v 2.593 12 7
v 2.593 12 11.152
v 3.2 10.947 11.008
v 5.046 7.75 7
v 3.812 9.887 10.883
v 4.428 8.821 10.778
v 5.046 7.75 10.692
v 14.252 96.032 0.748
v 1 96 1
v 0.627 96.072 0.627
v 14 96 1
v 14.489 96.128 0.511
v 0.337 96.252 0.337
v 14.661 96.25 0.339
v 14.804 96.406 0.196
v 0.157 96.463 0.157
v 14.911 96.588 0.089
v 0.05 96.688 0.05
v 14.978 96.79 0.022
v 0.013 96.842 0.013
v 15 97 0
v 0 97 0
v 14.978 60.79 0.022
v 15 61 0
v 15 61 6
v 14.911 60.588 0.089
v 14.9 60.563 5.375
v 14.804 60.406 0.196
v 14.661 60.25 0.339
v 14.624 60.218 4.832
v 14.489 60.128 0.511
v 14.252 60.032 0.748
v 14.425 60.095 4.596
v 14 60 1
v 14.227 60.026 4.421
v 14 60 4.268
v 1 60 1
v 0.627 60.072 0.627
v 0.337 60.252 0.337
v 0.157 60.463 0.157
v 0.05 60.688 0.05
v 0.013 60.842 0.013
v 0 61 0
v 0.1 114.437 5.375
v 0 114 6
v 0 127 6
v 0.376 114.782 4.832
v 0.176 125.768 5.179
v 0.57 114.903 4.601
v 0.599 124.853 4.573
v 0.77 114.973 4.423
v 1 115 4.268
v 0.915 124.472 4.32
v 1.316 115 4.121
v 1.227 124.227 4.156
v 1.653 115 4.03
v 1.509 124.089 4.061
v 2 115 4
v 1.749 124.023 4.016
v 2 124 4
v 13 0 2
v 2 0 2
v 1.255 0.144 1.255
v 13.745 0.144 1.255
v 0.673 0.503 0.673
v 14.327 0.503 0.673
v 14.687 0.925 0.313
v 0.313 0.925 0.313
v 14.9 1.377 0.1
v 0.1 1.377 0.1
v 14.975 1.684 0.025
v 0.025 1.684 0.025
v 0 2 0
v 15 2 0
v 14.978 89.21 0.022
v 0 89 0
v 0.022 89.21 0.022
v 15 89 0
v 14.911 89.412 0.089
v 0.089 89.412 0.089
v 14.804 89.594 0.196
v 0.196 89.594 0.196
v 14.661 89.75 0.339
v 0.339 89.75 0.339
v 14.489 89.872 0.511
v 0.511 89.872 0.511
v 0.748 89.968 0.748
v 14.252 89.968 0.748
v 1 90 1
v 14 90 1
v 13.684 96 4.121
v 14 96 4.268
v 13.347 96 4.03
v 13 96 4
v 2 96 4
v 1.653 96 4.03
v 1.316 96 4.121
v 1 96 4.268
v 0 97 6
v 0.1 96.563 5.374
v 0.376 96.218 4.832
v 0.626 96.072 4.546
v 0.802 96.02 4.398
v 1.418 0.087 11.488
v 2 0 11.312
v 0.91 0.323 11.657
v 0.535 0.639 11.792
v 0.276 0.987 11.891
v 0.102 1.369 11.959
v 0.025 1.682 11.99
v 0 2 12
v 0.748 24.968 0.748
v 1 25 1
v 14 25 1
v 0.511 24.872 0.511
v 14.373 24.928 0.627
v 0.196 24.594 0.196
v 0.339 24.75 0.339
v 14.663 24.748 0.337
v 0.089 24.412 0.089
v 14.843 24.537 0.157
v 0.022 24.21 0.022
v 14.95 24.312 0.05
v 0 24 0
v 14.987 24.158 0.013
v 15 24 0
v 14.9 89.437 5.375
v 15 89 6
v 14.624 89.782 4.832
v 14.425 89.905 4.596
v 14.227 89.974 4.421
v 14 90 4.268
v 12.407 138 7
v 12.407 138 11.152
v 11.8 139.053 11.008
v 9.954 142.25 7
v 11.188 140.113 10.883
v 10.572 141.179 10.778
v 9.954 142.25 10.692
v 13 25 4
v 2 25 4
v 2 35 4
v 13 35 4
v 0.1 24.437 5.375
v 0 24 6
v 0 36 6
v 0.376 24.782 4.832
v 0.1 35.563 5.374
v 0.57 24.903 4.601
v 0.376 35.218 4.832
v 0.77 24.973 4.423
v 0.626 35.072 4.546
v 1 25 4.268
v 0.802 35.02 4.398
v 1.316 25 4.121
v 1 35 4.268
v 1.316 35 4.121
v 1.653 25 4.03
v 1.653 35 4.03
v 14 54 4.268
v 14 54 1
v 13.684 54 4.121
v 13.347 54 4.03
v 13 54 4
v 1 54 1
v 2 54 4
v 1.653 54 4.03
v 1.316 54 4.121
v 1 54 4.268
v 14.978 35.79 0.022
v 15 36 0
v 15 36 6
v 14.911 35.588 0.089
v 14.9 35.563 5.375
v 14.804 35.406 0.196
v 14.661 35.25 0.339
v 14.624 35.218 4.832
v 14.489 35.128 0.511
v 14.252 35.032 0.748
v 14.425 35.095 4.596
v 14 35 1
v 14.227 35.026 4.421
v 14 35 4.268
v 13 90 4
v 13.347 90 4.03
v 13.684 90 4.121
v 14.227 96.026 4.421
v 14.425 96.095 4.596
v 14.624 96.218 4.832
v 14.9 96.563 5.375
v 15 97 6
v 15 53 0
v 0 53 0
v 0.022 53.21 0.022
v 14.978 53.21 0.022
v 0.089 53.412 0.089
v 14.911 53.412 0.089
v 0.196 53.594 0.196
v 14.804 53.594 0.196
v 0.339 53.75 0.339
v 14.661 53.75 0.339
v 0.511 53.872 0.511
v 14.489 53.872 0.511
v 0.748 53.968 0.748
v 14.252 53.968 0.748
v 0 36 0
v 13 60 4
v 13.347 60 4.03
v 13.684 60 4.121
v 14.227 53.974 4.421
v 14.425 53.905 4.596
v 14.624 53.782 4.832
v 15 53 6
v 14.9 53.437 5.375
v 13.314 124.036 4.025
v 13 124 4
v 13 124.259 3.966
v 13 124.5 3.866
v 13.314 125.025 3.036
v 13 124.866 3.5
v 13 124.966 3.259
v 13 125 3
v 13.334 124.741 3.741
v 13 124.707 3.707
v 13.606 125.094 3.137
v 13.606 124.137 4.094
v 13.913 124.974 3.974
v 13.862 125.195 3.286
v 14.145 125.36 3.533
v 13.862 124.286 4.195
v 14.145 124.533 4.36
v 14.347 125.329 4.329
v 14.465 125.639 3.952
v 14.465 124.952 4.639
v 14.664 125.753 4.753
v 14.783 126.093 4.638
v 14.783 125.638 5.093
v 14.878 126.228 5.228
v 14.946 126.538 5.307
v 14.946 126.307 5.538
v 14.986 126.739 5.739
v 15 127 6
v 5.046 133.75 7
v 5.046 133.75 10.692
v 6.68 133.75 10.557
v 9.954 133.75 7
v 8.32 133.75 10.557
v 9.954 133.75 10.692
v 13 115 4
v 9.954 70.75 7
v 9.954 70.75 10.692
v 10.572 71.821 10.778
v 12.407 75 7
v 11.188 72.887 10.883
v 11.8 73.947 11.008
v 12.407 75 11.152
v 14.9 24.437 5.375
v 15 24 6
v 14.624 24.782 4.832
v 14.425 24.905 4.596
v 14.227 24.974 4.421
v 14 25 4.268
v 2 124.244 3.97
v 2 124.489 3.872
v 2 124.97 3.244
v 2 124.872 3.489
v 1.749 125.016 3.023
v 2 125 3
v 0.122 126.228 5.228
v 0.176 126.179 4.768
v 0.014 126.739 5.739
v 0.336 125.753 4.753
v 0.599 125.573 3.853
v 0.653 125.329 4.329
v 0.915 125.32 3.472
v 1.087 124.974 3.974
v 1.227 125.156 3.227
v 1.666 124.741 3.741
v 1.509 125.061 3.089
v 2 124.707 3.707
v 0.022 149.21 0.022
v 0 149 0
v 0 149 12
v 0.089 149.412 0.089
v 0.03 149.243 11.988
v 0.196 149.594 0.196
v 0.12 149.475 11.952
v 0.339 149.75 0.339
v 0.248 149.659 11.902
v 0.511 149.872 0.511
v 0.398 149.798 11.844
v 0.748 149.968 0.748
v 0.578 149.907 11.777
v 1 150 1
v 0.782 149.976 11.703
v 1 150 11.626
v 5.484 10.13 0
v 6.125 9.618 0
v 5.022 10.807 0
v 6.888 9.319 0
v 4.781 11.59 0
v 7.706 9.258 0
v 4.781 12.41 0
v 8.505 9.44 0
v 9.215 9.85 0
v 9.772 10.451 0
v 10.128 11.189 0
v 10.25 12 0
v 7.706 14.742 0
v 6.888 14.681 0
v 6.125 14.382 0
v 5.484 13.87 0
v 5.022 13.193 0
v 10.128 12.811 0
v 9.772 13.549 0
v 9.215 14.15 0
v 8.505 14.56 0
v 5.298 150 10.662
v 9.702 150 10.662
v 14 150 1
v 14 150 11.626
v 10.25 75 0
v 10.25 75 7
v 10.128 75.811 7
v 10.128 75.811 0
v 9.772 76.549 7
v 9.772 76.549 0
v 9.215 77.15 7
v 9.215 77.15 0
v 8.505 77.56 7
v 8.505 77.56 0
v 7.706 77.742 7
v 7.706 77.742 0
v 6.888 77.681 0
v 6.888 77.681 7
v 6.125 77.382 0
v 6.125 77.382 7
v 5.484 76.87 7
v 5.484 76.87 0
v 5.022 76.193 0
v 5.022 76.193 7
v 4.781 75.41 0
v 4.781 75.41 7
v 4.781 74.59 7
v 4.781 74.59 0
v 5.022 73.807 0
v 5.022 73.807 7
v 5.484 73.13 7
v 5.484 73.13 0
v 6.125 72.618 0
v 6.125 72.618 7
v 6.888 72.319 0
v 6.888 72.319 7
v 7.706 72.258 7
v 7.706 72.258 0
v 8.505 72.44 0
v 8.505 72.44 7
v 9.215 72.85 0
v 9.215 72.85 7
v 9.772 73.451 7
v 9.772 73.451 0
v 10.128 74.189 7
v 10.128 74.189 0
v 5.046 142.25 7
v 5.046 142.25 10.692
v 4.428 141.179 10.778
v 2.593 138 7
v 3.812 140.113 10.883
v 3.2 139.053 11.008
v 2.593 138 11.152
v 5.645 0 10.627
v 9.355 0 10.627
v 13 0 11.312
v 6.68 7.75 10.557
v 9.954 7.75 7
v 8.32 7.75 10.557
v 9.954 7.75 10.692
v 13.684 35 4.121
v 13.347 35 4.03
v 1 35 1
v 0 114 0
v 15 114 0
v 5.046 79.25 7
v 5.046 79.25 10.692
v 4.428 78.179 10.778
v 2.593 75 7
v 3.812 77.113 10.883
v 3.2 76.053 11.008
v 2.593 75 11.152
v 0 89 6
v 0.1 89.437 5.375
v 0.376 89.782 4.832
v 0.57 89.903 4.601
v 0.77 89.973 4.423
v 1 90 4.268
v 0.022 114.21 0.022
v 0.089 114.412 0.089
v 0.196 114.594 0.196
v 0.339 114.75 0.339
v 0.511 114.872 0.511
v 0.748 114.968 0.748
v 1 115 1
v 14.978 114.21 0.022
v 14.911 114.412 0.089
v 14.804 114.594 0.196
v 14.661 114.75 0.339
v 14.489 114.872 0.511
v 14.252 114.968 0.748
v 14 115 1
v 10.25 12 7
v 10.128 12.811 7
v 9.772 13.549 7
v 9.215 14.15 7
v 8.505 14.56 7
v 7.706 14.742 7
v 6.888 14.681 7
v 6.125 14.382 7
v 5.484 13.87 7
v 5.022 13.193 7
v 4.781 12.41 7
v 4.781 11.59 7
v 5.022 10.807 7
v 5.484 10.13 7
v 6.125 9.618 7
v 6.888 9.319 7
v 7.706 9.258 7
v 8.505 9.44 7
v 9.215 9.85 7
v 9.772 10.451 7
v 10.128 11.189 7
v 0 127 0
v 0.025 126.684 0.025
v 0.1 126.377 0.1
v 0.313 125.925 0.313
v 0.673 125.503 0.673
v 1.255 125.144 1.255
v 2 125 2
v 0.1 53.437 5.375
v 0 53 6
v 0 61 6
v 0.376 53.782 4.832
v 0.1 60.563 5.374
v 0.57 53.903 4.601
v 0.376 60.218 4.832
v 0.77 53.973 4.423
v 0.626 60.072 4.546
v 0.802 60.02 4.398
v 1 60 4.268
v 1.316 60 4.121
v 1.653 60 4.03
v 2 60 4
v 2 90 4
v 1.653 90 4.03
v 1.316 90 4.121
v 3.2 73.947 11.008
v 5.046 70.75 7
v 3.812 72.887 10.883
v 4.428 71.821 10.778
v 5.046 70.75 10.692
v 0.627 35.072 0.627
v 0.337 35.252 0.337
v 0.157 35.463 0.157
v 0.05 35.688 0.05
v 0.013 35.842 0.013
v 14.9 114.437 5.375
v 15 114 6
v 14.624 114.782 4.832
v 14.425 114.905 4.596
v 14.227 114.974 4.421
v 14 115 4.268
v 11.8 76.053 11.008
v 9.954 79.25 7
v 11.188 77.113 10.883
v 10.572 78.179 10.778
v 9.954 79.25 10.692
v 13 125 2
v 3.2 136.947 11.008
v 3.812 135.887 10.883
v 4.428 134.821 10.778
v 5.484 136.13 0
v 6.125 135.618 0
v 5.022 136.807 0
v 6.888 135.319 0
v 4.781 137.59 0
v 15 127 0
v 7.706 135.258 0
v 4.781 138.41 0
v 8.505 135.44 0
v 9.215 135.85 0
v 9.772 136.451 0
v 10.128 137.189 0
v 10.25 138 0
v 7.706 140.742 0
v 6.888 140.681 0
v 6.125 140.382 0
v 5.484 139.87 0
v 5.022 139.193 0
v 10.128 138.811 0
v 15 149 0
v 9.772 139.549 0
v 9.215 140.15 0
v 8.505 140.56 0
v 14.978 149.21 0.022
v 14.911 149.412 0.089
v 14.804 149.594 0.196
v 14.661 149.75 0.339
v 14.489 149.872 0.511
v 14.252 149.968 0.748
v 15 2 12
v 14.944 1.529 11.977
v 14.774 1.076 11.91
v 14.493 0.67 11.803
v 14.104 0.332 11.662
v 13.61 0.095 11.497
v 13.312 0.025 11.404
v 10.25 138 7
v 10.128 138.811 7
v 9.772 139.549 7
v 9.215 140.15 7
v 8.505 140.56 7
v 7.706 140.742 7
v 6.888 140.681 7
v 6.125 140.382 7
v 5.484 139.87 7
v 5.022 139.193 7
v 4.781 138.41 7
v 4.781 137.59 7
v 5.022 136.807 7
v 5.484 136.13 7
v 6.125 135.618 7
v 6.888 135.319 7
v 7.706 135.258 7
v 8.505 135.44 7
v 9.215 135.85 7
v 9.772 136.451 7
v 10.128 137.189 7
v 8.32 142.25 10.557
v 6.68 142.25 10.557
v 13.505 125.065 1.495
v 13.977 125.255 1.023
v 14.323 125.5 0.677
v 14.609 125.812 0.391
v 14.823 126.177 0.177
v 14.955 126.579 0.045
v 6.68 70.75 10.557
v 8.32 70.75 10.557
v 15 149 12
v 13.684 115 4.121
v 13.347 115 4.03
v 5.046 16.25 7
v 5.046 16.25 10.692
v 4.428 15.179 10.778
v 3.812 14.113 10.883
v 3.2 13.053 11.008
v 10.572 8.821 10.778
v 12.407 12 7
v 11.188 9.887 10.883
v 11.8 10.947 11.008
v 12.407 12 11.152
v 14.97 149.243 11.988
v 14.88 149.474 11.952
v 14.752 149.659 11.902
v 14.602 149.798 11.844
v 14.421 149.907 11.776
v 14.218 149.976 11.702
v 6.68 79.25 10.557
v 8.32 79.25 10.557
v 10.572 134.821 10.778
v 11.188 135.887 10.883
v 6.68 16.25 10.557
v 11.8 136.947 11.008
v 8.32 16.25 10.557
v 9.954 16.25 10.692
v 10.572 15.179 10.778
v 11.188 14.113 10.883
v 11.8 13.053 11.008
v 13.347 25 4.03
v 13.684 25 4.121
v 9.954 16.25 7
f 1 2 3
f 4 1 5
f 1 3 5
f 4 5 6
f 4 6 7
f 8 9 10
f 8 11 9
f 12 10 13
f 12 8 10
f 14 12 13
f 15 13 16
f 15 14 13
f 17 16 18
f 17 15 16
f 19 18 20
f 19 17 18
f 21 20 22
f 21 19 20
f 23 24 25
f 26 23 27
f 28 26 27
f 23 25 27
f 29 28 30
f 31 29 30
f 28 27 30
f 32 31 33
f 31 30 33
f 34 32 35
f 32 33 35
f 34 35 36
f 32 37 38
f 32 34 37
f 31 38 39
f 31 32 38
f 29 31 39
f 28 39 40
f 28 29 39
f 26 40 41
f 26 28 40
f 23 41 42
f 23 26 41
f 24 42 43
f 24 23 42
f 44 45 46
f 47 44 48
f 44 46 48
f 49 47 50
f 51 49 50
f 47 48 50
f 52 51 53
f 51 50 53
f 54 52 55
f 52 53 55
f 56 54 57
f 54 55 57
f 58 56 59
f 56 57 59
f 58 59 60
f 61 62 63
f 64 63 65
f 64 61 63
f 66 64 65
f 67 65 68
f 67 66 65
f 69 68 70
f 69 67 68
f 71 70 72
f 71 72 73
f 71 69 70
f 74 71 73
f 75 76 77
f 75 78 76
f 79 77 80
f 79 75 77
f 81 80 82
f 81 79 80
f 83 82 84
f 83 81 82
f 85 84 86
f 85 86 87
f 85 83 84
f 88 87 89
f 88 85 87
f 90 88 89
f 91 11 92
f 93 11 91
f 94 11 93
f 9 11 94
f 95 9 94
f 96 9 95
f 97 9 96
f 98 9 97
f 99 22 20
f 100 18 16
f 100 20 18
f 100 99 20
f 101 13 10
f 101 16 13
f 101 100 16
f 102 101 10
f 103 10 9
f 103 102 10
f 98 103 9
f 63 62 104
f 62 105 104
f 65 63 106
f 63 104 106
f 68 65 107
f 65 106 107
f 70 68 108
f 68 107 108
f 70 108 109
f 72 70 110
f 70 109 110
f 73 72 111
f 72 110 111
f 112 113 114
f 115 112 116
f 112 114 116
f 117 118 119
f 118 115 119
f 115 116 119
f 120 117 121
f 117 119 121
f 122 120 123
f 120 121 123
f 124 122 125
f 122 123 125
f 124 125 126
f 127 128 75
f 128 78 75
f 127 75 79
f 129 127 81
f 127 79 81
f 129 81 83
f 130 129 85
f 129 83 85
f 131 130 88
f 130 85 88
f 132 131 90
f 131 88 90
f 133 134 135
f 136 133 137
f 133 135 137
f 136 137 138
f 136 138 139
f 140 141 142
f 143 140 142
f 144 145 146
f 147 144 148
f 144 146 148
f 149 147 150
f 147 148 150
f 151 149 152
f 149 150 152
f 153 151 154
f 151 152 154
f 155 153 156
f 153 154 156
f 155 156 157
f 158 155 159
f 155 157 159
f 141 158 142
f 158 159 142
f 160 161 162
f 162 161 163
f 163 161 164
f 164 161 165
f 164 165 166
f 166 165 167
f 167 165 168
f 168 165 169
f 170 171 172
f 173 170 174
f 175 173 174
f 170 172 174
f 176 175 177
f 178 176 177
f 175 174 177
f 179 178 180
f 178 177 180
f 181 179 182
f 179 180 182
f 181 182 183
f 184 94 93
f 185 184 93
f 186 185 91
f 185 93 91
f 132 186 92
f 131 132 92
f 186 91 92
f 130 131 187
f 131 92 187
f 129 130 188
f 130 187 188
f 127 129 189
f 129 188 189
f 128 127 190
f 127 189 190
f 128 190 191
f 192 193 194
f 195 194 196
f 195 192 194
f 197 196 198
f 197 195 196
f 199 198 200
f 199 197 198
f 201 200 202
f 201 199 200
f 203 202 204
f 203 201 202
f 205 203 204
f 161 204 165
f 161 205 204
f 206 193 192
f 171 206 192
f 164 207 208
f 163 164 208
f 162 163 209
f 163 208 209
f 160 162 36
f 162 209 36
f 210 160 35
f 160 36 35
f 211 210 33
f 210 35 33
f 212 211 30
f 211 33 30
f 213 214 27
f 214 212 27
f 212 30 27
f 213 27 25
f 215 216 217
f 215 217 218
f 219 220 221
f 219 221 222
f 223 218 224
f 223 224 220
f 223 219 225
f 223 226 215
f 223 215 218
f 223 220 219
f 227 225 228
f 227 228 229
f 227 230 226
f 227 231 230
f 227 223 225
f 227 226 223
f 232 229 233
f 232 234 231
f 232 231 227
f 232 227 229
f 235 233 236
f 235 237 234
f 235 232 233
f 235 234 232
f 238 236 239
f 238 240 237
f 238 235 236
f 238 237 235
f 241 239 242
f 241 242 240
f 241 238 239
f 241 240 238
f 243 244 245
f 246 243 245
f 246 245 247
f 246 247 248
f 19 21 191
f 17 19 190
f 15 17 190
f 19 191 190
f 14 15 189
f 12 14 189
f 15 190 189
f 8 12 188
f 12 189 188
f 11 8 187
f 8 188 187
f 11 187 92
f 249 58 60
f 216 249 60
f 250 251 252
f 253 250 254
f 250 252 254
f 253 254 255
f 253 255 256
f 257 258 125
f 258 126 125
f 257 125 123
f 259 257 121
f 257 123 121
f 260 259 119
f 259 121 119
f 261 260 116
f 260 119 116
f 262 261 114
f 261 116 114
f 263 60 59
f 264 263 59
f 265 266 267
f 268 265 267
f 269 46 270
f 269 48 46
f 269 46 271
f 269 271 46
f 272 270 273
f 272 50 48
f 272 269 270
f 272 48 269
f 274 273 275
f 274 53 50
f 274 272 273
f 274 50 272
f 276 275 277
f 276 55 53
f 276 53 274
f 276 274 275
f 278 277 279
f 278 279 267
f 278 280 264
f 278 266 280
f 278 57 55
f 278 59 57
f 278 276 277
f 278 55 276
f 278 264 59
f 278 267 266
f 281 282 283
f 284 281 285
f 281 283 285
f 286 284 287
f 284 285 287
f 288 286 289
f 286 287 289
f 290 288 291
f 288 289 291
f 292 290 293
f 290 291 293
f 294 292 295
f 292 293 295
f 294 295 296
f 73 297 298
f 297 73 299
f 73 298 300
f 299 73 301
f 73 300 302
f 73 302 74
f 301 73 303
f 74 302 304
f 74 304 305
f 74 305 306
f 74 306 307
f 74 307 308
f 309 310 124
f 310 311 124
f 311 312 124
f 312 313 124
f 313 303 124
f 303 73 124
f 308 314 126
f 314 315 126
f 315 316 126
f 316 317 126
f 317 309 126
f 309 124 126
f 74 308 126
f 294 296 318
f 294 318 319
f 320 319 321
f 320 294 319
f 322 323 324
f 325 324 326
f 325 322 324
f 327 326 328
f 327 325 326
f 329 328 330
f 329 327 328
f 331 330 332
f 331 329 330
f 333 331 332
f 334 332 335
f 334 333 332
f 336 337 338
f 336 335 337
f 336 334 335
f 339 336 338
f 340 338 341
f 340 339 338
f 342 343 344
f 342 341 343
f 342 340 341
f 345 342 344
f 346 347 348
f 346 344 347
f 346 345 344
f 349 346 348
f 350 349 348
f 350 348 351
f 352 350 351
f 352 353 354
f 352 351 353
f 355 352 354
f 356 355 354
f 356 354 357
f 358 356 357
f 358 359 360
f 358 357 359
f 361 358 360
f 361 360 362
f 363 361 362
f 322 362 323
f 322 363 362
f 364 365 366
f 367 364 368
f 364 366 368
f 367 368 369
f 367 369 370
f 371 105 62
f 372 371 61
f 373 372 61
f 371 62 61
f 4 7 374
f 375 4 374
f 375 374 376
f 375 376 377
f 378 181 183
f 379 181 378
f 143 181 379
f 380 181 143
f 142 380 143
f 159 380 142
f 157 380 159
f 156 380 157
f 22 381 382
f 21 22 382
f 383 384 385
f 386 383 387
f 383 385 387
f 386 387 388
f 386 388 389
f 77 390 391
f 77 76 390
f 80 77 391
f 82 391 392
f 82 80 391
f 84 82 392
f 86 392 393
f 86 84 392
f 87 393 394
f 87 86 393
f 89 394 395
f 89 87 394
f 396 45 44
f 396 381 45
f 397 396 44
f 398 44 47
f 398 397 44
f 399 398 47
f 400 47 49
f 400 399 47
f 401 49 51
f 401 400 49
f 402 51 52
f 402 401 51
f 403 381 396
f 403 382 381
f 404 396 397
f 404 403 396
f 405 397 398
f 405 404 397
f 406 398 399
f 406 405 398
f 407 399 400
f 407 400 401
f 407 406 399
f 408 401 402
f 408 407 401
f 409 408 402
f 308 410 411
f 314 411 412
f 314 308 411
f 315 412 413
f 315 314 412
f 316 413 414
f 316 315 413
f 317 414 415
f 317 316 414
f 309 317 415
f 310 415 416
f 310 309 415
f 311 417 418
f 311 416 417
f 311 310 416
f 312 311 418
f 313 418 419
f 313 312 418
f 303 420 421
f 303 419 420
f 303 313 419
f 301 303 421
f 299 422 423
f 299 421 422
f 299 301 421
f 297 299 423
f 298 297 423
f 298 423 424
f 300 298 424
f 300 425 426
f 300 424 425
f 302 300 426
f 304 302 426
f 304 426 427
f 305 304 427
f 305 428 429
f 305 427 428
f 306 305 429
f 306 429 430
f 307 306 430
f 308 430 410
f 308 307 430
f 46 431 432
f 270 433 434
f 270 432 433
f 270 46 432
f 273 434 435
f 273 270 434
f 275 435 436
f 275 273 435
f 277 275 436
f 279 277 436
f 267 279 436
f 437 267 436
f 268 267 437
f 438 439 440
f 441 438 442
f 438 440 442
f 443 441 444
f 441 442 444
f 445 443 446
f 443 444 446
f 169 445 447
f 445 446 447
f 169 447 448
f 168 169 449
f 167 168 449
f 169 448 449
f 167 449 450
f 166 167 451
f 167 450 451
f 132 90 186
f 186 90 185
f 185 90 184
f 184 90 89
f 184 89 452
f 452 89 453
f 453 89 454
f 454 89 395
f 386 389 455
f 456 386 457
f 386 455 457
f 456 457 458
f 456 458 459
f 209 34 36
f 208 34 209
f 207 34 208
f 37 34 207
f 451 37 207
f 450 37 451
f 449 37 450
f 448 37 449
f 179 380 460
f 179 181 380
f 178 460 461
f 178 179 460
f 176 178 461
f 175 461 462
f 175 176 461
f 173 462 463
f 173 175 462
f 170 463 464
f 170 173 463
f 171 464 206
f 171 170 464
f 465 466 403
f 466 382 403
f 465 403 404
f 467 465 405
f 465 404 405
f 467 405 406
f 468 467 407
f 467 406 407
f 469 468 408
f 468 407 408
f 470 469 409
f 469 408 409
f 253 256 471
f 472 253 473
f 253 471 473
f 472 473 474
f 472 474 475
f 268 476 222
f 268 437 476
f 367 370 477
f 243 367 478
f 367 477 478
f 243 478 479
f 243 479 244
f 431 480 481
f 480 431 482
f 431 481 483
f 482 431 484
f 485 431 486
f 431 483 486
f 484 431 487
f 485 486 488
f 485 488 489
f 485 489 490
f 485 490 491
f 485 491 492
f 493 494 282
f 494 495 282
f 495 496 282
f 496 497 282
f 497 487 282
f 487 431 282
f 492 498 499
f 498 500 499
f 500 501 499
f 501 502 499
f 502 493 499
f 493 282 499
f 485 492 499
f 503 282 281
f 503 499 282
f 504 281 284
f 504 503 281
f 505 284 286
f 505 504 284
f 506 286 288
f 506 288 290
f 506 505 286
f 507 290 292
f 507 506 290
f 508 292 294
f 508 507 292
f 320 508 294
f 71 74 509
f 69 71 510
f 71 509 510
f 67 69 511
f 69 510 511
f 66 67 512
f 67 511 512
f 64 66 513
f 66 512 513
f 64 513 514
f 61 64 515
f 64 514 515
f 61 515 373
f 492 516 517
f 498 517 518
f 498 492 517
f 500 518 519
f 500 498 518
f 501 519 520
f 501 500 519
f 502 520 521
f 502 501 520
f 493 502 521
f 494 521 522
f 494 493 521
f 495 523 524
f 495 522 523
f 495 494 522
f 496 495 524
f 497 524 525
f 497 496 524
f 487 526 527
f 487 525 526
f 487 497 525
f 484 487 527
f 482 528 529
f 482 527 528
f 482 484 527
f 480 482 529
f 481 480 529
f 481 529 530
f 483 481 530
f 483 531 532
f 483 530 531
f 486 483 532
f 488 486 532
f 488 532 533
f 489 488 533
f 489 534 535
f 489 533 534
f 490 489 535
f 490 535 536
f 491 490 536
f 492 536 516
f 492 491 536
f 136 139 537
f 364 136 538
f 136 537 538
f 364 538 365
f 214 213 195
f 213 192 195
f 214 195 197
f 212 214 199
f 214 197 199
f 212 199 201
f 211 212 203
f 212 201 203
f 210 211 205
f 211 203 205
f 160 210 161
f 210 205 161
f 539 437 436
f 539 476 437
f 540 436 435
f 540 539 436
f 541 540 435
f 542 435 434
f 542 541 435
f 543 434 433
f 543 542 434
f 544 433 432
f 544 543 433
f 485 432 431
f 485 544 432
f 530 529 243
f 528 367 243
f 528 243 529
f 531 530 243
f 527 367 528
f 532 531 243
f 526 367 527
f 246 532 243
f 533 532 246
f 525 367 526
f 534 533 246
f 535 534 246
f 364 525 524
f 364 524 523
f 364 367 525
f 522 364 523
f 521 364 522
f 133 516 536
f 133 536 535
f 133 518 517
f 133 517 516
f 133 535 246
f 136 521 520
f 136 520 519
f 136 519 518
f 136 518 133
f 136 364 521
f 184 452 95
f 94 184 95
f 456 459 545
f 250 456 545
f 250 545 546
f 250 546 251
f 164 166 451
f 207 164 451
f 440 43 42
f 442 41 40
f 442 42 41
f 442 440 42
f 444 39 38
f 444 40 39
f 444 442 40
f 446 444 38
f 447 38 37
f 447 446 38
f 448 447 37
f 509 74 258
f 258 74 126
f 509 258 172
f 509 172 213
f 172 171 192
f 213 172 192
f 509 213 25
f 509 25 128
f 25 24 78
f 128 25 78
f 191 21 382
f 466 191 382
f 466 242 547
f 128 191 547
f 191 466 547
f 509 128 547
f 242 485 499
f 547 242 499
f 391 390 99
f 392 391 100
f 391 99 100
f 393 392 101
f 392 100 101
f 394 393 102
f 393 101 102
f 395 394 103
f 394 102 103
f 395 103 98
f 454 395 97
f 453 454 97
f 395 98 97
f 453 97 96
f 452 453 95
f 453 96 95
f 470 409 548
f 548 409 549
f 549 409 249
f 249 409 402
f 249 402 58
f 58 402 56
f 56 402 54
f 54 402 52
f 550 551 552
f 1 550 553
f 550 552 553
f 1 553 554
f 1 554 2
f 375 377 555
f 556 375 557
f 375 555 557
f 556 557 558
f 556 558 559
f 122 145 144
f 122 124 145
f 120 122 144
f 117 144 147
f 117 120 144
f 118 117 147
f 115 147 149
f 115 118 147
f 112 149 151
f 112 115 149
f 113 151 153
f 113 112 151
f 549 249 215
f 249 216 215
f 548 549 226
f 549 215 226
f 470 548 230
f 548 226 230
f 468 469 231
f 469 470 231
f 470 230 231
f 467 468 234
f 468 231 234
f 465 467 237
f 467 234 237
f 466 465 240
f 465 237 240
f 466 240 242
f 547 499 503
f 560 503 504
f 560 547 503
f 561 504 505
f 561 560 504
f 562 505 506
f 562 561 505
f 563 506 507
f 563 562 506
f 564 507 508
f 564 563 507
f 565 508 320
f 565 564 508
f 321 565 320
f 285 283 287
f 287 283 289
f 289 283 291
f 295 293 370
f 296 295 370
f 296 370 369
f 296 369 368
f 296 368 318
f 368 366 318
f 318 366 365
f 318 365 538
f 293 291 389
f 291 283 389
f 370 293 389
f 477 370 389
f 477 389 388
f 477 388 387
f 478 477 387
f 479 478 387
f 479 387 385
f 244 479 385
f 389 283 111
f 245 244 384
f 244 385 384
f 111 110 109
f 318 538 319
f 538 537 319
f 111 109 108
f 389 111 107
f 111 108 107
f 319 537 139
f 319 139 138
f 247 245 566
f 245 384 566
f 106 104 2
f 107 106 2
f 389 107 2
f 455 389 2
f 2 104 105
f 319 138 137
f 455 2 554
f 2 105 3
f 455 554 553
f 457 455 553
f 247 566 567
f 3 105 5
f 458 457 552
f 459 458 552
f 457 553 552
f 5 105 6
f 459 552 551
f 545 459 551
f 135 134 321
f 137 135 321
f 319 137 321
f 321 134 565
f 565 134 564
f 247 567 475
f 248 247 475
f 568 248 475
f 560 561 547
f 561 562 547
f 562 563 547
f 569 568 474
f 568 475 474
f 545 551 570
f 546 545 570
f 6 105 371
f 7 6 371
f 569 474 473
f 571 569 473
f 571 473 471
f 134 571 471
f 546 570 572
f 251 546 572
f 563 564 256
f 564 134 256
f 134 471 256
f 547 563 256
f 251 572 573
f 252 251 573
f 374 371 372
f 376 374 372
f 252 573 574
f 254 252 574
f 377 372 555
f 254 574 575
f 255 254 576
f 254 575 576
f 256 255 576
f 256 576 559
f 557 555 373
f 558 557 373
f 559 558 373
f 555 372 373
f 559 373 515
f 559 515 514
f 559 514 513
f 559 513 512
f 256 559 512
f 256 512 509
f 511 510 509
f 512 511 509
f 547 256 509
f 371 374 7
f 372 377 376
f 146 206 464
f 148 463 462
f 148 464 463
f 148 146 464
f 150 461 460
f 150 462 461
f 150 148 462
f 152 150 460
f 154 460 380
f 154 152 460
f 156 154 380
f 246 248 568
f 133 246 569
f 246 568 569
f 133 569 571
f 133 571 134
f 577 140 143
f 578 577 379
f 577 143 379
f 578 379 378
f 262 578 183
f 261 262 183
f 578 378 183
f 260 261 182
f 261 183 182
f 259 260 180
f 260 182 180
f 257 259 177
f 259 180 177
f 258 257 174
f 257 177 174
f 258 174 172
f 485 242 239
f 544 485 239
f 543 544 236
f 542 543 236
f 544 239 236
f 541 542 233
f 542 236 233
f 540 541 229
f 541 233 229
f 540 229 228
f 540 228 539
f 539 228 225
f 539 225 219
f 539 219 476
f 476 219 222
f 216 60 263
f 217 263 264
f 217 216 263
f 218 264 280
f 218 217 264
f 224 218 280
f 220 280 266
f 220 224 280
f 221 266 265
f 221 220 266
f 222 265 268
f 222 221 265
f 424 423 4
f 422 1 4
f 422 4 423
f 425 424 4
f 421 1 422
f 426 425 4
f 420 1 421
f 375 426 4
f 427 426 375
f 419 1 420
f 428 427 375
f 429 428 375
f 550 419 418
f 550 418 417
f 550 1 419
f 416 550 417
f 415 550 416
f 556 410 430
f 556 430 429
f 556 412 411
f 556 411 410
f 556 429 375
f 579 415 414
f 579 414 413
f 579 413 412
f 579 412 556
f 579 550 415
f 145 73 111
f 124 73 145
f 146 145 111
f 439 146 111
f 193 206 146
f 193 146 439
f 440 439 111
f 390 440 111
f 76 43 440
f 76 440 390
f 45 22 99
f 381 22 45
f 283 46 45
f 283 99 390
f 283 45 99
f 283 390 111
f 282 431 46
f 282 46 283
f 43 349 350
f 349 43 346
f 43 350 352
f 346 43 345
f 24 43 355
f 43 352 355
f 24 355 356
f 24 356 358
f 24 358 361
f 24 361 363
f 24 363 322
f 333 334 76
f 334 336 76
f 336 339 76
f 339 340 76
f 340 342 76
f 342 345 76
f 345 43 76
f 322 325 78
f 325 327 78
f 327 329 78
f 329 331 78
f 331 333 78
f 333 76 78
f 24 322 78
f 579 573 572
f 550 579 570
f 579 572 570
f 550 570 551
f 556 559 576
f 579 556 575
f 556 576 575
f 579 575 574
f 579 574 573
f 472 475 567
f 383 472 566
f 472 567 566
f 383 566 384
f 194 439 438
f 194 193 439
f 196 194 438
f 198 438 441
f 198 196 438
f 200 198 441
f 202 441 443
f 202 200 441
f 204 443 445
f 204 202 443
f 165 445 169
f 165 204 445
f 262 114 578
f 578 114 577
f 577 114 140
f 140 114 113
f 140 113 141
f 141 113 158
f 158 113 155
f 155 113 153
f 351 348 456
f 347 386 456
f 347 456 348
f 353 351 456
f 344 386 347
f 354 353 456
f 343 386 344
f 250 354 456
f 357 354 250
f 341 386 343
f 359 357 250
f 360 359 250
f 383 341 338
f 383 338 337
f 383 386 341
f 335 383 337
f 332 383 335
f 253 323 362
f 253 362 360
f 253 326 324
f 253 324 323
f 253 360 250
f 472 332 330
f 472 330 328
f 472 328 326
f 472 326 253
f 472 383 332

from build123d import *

# Parameters (mm, degrees)
SKETCH_W        = 15
SKETCH_H        = 150
SKETCH_R        = 2.75
PAD_DEPTH       = 12
SKETCH003_W     = 10
SKETCH003_H     = 4
SKETCH003_W_2   = 6
POCKET002_DEPTH = 15.001
SKETCH004_R     = 20
POCKET003_DEPTH = 150.001
POCKET_DEPTH    = 5
FILLET_R        = 2
FILLET001_R     = 2
FILLET002_R     = 1
FILLET003_R     = 1
FILLET004_R     = 1
FILLET005_R     = 1
FILLET006_R     = 1
FILLET007_R     = 2


with BuildPart() as part:
    # Sketch → Pad (new body)
    with BuildSketch(Plane.XY):
        with Locations((7.5, 75)):
            Rectangle(SKETCH_W, SKETCH_H)
        with Locations((7.5, 138)):
            Circle(SKETCH_R, mode=Mode.SUBTRACT)
        with Locations((7.5, 75)):
            Circle(SKETCH_R, mode=Mode.SUBTRACT)
        with Locations((7.5, 12)):
            Circle(SKETCH_R, mode=Mode.SUBTRACT)
    extrude(amount=PAD_DEPTH)

    # Sketch003 → Pocket002 (cut, through all)
    with BuildSketch(Plane.YZ):
        with Locations((30, 2)):
            Rectangle(SKETCH003_W, SKETCH003_H)
        with Locations((57, 2)):
            Rectangle(SKETCH003_W_2, SKETCH003_H)
        with Locations((120, 2)):
            Rectangle(SKETCH003_W, SKETCH003_H)
        with Locations((93, 2)):
            Rectangle(SKETCH003_W_2, SKETCH003_H)
    extrude(amount=POCKET002_DEPTH, mode=Mode.SUBTRACT)

    # Sketch004 → Pocket003 (cut, through all)
    with BuildSketch(Plane.XZ):
        with Locations((7.5, 30.540496)):
            Circle(SKETCH004_R)
    extrude(amount=-POCKET003_DEPTH, mode=Mode.SUBTRACT)

    # Sketch005 → Pocket (cut)
    with BuildSketch(Plane.XY.offset(12)):
        Polygon((9.953739, 133.75), (12.407477, 138), (9.953739, 142.25), (5.046261, 142.25), (2.592523, 138), (5.046261, 133.75), align=None)
        Polygon((9.953739, 70.75), (12.407477, 75), (9.953739, 79.25), (5.046261, 79.25), (2.592523, 75), (5.046261, 70.75), align=None)
        Polygon((9.953739, 16.25), (5.046261, 16.25), (2.592523, 12), (5.046261, 7.75), (9.953739, 7.75), (12.407477, 12), align=None)
    extrude(amount=-POCKET_DEPTH, mode=Mode.SUBTRACT)

    # Fillet
    fillet_edges = [part.edges().sort_by_distance(p)[0] for p in [
        (15, 120, 4),
        (0, 120, 4),
        (15, 93, 4),
        (0, 93, 4),
        (15, 57, 4),
        (0, 57, 4),
        (15, 30, 4),
        (0, 30, 4),
    ]]
    fillet(fillet_edges, radius=FILLET_R)

    # Fillet001
    fillet001_edges = [part.edges().sort_by_distance(p)[0] for p in [
        (15, 125, 2),
        (7.5, 125, 0),
        (0, 125, 2),
    ]]
    fillet(fillet001_edges, radius=FILLET001_R)

    # Fillet002
    fillet002_edges = [part.edges().sort_by_distance(p)[0] for p in [
        (7.5, 125, 4),
    ]]
    fillet(fillet002_edges, radius=FILLET002_R)

    # Fillet003
    fillet003_edges = [part.edges().sort_by_distance(p)[0] for p in [
        (0, 25, 2),
        (7.5, 25, 0),
        (15, 25, 2),
    ]]
    fillet(fillet003_edges, radius=FILLET003_R)

    # Fillet004
    fillet004_edges = [part.edges().sort_by_distance(p)[0] for p in [
        (0, 54, 2),
        (7.5, 54, 0),
        (15, 54, 2),
        (0, 90, 2),
        (7.5, 90, 0),
        (15, 90, 2),
        (0, 115, 2),
        (7.5, 115, 0),
        (15, 115, 2),
    ]]
    fillet(fillet004_edges, radius=FILLET004_R)

    # Fillet005
    fillet005_edges = [part.edges().sort_by_distance(p)[0] for p in [
        (15, 96, 2),
        (7.5, 96, 0),
        (0, 96, 2),
        (15, 60, 2),
        (7.5, 60, 0),
        (0, 60, 2),
        (15, 35, 2),
        (7.5, 35, 0),
        (0, 35, 2),
    ]]
    fillet(fillet005_edges, radius=FILLET005_R)

    # Fillet006
    fillet006_edges = [part.edges().sort_by_distance(p)[0] for p in [
        (15, 150, 6),
        (7.5, 150, 0),
        (0, 150, 6),
    ]]
    fillet(fillet006_edges, radius=FILLET006_R)

    # Fillet007
    fillet007_edges = [part.edges().sort_by_distance(p)[0] for p in [
        (0, 0, 6),
        (7.5, 0, 0),
        (15, 0, 6),
    ]]
    fillet(fillet007_edges, radius=FILLET007_R)


solid = part.part
